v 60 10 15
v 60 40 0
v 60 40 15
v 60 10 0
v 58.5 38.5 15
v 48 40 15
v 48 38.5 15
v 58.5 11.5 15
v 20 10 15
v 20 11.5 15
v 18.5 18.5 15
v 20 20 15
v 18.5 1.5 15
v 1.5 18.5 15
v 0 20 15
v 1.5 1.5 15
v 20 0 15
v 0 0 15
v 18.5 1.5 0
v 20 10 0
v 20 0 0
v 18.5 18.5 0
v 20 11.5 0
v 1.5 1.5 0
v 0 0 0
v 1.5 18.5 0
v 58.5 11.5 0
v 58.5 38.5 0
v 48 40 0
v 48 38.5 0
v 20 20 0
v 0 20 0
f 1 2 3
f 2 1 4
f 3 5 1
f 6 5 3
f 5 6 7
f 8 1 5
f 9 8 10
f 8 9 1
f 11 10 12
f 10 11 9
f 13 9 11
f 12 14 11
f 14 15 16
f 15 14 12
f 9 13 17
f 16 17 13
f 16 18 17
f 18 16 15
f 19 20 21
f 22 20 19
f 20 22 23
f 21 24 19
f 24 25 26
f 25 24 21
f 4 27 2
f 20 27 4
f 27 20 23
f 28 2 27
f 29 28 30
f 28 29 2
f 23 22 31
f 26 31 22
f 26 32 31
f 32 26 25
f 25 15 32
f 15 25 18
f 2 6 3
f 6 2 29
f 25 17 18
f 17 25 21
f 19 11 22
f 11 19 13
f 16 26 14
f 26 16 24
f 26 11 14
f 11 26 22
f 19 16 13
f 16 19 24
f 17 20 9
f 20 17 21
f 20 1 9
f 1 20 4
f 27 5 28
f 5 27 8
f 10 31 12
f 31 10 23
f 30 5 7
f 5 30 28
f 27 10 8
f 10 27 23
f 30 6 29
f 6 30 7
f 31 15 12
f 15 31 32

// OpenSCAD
/*

wiperHook
****************************************

*/

// Resolution variables
$fa = 1;
$fs = 0.4;

// Main dimension variables
hookWidthZ = 15;
loopRibLength = 20;
hookRibOne = 40;
hookRibTwo = 30;
hookRibThree = 10;
wallThikness = 1.5;

// Calculated vareables

hookLocationOnLoop = loopRibLength / 2; // The location of the hook on the loop rib (in this case it's in the middle of the loop rib)

// Modules

module wiperHook(){
    difference(){
        cube([loopRibLength + hookRibOne, hookLocationOnLoop + hookRibTwo, hookWidthZ]);

        // Loop section
        translate([wallThikness, wallThikness, - 2])
            cube([loopRibLength - (2 * wallThikness), loopRibLength - (2 * wallThikness), hookWidthZ * 20]);

        // Rib one
        translate([loopRibLength, - 2, -2])
            cube([hookRibOne * 2, hookLocationOnLoop + 2 , hookWidthZ * 20]);
        
        // Rib Two
        translate([loopRibLength, hookLocationOnLoop + wallThikness, -2])
            cube([hookRibOne - wallThikness, hookRibTwo - (wallThikness * 2), hookWidthZ * 20]);
        
        // Rib Three
        translate([- 2, loopRibLength, -2])
            cube([loopRibLength + (hookRibOne - hookRibThree), hookRibTwo * 2, hookWidthZ * 20]);
    }    
}

// Generate the wiper hook
wiperHook();
